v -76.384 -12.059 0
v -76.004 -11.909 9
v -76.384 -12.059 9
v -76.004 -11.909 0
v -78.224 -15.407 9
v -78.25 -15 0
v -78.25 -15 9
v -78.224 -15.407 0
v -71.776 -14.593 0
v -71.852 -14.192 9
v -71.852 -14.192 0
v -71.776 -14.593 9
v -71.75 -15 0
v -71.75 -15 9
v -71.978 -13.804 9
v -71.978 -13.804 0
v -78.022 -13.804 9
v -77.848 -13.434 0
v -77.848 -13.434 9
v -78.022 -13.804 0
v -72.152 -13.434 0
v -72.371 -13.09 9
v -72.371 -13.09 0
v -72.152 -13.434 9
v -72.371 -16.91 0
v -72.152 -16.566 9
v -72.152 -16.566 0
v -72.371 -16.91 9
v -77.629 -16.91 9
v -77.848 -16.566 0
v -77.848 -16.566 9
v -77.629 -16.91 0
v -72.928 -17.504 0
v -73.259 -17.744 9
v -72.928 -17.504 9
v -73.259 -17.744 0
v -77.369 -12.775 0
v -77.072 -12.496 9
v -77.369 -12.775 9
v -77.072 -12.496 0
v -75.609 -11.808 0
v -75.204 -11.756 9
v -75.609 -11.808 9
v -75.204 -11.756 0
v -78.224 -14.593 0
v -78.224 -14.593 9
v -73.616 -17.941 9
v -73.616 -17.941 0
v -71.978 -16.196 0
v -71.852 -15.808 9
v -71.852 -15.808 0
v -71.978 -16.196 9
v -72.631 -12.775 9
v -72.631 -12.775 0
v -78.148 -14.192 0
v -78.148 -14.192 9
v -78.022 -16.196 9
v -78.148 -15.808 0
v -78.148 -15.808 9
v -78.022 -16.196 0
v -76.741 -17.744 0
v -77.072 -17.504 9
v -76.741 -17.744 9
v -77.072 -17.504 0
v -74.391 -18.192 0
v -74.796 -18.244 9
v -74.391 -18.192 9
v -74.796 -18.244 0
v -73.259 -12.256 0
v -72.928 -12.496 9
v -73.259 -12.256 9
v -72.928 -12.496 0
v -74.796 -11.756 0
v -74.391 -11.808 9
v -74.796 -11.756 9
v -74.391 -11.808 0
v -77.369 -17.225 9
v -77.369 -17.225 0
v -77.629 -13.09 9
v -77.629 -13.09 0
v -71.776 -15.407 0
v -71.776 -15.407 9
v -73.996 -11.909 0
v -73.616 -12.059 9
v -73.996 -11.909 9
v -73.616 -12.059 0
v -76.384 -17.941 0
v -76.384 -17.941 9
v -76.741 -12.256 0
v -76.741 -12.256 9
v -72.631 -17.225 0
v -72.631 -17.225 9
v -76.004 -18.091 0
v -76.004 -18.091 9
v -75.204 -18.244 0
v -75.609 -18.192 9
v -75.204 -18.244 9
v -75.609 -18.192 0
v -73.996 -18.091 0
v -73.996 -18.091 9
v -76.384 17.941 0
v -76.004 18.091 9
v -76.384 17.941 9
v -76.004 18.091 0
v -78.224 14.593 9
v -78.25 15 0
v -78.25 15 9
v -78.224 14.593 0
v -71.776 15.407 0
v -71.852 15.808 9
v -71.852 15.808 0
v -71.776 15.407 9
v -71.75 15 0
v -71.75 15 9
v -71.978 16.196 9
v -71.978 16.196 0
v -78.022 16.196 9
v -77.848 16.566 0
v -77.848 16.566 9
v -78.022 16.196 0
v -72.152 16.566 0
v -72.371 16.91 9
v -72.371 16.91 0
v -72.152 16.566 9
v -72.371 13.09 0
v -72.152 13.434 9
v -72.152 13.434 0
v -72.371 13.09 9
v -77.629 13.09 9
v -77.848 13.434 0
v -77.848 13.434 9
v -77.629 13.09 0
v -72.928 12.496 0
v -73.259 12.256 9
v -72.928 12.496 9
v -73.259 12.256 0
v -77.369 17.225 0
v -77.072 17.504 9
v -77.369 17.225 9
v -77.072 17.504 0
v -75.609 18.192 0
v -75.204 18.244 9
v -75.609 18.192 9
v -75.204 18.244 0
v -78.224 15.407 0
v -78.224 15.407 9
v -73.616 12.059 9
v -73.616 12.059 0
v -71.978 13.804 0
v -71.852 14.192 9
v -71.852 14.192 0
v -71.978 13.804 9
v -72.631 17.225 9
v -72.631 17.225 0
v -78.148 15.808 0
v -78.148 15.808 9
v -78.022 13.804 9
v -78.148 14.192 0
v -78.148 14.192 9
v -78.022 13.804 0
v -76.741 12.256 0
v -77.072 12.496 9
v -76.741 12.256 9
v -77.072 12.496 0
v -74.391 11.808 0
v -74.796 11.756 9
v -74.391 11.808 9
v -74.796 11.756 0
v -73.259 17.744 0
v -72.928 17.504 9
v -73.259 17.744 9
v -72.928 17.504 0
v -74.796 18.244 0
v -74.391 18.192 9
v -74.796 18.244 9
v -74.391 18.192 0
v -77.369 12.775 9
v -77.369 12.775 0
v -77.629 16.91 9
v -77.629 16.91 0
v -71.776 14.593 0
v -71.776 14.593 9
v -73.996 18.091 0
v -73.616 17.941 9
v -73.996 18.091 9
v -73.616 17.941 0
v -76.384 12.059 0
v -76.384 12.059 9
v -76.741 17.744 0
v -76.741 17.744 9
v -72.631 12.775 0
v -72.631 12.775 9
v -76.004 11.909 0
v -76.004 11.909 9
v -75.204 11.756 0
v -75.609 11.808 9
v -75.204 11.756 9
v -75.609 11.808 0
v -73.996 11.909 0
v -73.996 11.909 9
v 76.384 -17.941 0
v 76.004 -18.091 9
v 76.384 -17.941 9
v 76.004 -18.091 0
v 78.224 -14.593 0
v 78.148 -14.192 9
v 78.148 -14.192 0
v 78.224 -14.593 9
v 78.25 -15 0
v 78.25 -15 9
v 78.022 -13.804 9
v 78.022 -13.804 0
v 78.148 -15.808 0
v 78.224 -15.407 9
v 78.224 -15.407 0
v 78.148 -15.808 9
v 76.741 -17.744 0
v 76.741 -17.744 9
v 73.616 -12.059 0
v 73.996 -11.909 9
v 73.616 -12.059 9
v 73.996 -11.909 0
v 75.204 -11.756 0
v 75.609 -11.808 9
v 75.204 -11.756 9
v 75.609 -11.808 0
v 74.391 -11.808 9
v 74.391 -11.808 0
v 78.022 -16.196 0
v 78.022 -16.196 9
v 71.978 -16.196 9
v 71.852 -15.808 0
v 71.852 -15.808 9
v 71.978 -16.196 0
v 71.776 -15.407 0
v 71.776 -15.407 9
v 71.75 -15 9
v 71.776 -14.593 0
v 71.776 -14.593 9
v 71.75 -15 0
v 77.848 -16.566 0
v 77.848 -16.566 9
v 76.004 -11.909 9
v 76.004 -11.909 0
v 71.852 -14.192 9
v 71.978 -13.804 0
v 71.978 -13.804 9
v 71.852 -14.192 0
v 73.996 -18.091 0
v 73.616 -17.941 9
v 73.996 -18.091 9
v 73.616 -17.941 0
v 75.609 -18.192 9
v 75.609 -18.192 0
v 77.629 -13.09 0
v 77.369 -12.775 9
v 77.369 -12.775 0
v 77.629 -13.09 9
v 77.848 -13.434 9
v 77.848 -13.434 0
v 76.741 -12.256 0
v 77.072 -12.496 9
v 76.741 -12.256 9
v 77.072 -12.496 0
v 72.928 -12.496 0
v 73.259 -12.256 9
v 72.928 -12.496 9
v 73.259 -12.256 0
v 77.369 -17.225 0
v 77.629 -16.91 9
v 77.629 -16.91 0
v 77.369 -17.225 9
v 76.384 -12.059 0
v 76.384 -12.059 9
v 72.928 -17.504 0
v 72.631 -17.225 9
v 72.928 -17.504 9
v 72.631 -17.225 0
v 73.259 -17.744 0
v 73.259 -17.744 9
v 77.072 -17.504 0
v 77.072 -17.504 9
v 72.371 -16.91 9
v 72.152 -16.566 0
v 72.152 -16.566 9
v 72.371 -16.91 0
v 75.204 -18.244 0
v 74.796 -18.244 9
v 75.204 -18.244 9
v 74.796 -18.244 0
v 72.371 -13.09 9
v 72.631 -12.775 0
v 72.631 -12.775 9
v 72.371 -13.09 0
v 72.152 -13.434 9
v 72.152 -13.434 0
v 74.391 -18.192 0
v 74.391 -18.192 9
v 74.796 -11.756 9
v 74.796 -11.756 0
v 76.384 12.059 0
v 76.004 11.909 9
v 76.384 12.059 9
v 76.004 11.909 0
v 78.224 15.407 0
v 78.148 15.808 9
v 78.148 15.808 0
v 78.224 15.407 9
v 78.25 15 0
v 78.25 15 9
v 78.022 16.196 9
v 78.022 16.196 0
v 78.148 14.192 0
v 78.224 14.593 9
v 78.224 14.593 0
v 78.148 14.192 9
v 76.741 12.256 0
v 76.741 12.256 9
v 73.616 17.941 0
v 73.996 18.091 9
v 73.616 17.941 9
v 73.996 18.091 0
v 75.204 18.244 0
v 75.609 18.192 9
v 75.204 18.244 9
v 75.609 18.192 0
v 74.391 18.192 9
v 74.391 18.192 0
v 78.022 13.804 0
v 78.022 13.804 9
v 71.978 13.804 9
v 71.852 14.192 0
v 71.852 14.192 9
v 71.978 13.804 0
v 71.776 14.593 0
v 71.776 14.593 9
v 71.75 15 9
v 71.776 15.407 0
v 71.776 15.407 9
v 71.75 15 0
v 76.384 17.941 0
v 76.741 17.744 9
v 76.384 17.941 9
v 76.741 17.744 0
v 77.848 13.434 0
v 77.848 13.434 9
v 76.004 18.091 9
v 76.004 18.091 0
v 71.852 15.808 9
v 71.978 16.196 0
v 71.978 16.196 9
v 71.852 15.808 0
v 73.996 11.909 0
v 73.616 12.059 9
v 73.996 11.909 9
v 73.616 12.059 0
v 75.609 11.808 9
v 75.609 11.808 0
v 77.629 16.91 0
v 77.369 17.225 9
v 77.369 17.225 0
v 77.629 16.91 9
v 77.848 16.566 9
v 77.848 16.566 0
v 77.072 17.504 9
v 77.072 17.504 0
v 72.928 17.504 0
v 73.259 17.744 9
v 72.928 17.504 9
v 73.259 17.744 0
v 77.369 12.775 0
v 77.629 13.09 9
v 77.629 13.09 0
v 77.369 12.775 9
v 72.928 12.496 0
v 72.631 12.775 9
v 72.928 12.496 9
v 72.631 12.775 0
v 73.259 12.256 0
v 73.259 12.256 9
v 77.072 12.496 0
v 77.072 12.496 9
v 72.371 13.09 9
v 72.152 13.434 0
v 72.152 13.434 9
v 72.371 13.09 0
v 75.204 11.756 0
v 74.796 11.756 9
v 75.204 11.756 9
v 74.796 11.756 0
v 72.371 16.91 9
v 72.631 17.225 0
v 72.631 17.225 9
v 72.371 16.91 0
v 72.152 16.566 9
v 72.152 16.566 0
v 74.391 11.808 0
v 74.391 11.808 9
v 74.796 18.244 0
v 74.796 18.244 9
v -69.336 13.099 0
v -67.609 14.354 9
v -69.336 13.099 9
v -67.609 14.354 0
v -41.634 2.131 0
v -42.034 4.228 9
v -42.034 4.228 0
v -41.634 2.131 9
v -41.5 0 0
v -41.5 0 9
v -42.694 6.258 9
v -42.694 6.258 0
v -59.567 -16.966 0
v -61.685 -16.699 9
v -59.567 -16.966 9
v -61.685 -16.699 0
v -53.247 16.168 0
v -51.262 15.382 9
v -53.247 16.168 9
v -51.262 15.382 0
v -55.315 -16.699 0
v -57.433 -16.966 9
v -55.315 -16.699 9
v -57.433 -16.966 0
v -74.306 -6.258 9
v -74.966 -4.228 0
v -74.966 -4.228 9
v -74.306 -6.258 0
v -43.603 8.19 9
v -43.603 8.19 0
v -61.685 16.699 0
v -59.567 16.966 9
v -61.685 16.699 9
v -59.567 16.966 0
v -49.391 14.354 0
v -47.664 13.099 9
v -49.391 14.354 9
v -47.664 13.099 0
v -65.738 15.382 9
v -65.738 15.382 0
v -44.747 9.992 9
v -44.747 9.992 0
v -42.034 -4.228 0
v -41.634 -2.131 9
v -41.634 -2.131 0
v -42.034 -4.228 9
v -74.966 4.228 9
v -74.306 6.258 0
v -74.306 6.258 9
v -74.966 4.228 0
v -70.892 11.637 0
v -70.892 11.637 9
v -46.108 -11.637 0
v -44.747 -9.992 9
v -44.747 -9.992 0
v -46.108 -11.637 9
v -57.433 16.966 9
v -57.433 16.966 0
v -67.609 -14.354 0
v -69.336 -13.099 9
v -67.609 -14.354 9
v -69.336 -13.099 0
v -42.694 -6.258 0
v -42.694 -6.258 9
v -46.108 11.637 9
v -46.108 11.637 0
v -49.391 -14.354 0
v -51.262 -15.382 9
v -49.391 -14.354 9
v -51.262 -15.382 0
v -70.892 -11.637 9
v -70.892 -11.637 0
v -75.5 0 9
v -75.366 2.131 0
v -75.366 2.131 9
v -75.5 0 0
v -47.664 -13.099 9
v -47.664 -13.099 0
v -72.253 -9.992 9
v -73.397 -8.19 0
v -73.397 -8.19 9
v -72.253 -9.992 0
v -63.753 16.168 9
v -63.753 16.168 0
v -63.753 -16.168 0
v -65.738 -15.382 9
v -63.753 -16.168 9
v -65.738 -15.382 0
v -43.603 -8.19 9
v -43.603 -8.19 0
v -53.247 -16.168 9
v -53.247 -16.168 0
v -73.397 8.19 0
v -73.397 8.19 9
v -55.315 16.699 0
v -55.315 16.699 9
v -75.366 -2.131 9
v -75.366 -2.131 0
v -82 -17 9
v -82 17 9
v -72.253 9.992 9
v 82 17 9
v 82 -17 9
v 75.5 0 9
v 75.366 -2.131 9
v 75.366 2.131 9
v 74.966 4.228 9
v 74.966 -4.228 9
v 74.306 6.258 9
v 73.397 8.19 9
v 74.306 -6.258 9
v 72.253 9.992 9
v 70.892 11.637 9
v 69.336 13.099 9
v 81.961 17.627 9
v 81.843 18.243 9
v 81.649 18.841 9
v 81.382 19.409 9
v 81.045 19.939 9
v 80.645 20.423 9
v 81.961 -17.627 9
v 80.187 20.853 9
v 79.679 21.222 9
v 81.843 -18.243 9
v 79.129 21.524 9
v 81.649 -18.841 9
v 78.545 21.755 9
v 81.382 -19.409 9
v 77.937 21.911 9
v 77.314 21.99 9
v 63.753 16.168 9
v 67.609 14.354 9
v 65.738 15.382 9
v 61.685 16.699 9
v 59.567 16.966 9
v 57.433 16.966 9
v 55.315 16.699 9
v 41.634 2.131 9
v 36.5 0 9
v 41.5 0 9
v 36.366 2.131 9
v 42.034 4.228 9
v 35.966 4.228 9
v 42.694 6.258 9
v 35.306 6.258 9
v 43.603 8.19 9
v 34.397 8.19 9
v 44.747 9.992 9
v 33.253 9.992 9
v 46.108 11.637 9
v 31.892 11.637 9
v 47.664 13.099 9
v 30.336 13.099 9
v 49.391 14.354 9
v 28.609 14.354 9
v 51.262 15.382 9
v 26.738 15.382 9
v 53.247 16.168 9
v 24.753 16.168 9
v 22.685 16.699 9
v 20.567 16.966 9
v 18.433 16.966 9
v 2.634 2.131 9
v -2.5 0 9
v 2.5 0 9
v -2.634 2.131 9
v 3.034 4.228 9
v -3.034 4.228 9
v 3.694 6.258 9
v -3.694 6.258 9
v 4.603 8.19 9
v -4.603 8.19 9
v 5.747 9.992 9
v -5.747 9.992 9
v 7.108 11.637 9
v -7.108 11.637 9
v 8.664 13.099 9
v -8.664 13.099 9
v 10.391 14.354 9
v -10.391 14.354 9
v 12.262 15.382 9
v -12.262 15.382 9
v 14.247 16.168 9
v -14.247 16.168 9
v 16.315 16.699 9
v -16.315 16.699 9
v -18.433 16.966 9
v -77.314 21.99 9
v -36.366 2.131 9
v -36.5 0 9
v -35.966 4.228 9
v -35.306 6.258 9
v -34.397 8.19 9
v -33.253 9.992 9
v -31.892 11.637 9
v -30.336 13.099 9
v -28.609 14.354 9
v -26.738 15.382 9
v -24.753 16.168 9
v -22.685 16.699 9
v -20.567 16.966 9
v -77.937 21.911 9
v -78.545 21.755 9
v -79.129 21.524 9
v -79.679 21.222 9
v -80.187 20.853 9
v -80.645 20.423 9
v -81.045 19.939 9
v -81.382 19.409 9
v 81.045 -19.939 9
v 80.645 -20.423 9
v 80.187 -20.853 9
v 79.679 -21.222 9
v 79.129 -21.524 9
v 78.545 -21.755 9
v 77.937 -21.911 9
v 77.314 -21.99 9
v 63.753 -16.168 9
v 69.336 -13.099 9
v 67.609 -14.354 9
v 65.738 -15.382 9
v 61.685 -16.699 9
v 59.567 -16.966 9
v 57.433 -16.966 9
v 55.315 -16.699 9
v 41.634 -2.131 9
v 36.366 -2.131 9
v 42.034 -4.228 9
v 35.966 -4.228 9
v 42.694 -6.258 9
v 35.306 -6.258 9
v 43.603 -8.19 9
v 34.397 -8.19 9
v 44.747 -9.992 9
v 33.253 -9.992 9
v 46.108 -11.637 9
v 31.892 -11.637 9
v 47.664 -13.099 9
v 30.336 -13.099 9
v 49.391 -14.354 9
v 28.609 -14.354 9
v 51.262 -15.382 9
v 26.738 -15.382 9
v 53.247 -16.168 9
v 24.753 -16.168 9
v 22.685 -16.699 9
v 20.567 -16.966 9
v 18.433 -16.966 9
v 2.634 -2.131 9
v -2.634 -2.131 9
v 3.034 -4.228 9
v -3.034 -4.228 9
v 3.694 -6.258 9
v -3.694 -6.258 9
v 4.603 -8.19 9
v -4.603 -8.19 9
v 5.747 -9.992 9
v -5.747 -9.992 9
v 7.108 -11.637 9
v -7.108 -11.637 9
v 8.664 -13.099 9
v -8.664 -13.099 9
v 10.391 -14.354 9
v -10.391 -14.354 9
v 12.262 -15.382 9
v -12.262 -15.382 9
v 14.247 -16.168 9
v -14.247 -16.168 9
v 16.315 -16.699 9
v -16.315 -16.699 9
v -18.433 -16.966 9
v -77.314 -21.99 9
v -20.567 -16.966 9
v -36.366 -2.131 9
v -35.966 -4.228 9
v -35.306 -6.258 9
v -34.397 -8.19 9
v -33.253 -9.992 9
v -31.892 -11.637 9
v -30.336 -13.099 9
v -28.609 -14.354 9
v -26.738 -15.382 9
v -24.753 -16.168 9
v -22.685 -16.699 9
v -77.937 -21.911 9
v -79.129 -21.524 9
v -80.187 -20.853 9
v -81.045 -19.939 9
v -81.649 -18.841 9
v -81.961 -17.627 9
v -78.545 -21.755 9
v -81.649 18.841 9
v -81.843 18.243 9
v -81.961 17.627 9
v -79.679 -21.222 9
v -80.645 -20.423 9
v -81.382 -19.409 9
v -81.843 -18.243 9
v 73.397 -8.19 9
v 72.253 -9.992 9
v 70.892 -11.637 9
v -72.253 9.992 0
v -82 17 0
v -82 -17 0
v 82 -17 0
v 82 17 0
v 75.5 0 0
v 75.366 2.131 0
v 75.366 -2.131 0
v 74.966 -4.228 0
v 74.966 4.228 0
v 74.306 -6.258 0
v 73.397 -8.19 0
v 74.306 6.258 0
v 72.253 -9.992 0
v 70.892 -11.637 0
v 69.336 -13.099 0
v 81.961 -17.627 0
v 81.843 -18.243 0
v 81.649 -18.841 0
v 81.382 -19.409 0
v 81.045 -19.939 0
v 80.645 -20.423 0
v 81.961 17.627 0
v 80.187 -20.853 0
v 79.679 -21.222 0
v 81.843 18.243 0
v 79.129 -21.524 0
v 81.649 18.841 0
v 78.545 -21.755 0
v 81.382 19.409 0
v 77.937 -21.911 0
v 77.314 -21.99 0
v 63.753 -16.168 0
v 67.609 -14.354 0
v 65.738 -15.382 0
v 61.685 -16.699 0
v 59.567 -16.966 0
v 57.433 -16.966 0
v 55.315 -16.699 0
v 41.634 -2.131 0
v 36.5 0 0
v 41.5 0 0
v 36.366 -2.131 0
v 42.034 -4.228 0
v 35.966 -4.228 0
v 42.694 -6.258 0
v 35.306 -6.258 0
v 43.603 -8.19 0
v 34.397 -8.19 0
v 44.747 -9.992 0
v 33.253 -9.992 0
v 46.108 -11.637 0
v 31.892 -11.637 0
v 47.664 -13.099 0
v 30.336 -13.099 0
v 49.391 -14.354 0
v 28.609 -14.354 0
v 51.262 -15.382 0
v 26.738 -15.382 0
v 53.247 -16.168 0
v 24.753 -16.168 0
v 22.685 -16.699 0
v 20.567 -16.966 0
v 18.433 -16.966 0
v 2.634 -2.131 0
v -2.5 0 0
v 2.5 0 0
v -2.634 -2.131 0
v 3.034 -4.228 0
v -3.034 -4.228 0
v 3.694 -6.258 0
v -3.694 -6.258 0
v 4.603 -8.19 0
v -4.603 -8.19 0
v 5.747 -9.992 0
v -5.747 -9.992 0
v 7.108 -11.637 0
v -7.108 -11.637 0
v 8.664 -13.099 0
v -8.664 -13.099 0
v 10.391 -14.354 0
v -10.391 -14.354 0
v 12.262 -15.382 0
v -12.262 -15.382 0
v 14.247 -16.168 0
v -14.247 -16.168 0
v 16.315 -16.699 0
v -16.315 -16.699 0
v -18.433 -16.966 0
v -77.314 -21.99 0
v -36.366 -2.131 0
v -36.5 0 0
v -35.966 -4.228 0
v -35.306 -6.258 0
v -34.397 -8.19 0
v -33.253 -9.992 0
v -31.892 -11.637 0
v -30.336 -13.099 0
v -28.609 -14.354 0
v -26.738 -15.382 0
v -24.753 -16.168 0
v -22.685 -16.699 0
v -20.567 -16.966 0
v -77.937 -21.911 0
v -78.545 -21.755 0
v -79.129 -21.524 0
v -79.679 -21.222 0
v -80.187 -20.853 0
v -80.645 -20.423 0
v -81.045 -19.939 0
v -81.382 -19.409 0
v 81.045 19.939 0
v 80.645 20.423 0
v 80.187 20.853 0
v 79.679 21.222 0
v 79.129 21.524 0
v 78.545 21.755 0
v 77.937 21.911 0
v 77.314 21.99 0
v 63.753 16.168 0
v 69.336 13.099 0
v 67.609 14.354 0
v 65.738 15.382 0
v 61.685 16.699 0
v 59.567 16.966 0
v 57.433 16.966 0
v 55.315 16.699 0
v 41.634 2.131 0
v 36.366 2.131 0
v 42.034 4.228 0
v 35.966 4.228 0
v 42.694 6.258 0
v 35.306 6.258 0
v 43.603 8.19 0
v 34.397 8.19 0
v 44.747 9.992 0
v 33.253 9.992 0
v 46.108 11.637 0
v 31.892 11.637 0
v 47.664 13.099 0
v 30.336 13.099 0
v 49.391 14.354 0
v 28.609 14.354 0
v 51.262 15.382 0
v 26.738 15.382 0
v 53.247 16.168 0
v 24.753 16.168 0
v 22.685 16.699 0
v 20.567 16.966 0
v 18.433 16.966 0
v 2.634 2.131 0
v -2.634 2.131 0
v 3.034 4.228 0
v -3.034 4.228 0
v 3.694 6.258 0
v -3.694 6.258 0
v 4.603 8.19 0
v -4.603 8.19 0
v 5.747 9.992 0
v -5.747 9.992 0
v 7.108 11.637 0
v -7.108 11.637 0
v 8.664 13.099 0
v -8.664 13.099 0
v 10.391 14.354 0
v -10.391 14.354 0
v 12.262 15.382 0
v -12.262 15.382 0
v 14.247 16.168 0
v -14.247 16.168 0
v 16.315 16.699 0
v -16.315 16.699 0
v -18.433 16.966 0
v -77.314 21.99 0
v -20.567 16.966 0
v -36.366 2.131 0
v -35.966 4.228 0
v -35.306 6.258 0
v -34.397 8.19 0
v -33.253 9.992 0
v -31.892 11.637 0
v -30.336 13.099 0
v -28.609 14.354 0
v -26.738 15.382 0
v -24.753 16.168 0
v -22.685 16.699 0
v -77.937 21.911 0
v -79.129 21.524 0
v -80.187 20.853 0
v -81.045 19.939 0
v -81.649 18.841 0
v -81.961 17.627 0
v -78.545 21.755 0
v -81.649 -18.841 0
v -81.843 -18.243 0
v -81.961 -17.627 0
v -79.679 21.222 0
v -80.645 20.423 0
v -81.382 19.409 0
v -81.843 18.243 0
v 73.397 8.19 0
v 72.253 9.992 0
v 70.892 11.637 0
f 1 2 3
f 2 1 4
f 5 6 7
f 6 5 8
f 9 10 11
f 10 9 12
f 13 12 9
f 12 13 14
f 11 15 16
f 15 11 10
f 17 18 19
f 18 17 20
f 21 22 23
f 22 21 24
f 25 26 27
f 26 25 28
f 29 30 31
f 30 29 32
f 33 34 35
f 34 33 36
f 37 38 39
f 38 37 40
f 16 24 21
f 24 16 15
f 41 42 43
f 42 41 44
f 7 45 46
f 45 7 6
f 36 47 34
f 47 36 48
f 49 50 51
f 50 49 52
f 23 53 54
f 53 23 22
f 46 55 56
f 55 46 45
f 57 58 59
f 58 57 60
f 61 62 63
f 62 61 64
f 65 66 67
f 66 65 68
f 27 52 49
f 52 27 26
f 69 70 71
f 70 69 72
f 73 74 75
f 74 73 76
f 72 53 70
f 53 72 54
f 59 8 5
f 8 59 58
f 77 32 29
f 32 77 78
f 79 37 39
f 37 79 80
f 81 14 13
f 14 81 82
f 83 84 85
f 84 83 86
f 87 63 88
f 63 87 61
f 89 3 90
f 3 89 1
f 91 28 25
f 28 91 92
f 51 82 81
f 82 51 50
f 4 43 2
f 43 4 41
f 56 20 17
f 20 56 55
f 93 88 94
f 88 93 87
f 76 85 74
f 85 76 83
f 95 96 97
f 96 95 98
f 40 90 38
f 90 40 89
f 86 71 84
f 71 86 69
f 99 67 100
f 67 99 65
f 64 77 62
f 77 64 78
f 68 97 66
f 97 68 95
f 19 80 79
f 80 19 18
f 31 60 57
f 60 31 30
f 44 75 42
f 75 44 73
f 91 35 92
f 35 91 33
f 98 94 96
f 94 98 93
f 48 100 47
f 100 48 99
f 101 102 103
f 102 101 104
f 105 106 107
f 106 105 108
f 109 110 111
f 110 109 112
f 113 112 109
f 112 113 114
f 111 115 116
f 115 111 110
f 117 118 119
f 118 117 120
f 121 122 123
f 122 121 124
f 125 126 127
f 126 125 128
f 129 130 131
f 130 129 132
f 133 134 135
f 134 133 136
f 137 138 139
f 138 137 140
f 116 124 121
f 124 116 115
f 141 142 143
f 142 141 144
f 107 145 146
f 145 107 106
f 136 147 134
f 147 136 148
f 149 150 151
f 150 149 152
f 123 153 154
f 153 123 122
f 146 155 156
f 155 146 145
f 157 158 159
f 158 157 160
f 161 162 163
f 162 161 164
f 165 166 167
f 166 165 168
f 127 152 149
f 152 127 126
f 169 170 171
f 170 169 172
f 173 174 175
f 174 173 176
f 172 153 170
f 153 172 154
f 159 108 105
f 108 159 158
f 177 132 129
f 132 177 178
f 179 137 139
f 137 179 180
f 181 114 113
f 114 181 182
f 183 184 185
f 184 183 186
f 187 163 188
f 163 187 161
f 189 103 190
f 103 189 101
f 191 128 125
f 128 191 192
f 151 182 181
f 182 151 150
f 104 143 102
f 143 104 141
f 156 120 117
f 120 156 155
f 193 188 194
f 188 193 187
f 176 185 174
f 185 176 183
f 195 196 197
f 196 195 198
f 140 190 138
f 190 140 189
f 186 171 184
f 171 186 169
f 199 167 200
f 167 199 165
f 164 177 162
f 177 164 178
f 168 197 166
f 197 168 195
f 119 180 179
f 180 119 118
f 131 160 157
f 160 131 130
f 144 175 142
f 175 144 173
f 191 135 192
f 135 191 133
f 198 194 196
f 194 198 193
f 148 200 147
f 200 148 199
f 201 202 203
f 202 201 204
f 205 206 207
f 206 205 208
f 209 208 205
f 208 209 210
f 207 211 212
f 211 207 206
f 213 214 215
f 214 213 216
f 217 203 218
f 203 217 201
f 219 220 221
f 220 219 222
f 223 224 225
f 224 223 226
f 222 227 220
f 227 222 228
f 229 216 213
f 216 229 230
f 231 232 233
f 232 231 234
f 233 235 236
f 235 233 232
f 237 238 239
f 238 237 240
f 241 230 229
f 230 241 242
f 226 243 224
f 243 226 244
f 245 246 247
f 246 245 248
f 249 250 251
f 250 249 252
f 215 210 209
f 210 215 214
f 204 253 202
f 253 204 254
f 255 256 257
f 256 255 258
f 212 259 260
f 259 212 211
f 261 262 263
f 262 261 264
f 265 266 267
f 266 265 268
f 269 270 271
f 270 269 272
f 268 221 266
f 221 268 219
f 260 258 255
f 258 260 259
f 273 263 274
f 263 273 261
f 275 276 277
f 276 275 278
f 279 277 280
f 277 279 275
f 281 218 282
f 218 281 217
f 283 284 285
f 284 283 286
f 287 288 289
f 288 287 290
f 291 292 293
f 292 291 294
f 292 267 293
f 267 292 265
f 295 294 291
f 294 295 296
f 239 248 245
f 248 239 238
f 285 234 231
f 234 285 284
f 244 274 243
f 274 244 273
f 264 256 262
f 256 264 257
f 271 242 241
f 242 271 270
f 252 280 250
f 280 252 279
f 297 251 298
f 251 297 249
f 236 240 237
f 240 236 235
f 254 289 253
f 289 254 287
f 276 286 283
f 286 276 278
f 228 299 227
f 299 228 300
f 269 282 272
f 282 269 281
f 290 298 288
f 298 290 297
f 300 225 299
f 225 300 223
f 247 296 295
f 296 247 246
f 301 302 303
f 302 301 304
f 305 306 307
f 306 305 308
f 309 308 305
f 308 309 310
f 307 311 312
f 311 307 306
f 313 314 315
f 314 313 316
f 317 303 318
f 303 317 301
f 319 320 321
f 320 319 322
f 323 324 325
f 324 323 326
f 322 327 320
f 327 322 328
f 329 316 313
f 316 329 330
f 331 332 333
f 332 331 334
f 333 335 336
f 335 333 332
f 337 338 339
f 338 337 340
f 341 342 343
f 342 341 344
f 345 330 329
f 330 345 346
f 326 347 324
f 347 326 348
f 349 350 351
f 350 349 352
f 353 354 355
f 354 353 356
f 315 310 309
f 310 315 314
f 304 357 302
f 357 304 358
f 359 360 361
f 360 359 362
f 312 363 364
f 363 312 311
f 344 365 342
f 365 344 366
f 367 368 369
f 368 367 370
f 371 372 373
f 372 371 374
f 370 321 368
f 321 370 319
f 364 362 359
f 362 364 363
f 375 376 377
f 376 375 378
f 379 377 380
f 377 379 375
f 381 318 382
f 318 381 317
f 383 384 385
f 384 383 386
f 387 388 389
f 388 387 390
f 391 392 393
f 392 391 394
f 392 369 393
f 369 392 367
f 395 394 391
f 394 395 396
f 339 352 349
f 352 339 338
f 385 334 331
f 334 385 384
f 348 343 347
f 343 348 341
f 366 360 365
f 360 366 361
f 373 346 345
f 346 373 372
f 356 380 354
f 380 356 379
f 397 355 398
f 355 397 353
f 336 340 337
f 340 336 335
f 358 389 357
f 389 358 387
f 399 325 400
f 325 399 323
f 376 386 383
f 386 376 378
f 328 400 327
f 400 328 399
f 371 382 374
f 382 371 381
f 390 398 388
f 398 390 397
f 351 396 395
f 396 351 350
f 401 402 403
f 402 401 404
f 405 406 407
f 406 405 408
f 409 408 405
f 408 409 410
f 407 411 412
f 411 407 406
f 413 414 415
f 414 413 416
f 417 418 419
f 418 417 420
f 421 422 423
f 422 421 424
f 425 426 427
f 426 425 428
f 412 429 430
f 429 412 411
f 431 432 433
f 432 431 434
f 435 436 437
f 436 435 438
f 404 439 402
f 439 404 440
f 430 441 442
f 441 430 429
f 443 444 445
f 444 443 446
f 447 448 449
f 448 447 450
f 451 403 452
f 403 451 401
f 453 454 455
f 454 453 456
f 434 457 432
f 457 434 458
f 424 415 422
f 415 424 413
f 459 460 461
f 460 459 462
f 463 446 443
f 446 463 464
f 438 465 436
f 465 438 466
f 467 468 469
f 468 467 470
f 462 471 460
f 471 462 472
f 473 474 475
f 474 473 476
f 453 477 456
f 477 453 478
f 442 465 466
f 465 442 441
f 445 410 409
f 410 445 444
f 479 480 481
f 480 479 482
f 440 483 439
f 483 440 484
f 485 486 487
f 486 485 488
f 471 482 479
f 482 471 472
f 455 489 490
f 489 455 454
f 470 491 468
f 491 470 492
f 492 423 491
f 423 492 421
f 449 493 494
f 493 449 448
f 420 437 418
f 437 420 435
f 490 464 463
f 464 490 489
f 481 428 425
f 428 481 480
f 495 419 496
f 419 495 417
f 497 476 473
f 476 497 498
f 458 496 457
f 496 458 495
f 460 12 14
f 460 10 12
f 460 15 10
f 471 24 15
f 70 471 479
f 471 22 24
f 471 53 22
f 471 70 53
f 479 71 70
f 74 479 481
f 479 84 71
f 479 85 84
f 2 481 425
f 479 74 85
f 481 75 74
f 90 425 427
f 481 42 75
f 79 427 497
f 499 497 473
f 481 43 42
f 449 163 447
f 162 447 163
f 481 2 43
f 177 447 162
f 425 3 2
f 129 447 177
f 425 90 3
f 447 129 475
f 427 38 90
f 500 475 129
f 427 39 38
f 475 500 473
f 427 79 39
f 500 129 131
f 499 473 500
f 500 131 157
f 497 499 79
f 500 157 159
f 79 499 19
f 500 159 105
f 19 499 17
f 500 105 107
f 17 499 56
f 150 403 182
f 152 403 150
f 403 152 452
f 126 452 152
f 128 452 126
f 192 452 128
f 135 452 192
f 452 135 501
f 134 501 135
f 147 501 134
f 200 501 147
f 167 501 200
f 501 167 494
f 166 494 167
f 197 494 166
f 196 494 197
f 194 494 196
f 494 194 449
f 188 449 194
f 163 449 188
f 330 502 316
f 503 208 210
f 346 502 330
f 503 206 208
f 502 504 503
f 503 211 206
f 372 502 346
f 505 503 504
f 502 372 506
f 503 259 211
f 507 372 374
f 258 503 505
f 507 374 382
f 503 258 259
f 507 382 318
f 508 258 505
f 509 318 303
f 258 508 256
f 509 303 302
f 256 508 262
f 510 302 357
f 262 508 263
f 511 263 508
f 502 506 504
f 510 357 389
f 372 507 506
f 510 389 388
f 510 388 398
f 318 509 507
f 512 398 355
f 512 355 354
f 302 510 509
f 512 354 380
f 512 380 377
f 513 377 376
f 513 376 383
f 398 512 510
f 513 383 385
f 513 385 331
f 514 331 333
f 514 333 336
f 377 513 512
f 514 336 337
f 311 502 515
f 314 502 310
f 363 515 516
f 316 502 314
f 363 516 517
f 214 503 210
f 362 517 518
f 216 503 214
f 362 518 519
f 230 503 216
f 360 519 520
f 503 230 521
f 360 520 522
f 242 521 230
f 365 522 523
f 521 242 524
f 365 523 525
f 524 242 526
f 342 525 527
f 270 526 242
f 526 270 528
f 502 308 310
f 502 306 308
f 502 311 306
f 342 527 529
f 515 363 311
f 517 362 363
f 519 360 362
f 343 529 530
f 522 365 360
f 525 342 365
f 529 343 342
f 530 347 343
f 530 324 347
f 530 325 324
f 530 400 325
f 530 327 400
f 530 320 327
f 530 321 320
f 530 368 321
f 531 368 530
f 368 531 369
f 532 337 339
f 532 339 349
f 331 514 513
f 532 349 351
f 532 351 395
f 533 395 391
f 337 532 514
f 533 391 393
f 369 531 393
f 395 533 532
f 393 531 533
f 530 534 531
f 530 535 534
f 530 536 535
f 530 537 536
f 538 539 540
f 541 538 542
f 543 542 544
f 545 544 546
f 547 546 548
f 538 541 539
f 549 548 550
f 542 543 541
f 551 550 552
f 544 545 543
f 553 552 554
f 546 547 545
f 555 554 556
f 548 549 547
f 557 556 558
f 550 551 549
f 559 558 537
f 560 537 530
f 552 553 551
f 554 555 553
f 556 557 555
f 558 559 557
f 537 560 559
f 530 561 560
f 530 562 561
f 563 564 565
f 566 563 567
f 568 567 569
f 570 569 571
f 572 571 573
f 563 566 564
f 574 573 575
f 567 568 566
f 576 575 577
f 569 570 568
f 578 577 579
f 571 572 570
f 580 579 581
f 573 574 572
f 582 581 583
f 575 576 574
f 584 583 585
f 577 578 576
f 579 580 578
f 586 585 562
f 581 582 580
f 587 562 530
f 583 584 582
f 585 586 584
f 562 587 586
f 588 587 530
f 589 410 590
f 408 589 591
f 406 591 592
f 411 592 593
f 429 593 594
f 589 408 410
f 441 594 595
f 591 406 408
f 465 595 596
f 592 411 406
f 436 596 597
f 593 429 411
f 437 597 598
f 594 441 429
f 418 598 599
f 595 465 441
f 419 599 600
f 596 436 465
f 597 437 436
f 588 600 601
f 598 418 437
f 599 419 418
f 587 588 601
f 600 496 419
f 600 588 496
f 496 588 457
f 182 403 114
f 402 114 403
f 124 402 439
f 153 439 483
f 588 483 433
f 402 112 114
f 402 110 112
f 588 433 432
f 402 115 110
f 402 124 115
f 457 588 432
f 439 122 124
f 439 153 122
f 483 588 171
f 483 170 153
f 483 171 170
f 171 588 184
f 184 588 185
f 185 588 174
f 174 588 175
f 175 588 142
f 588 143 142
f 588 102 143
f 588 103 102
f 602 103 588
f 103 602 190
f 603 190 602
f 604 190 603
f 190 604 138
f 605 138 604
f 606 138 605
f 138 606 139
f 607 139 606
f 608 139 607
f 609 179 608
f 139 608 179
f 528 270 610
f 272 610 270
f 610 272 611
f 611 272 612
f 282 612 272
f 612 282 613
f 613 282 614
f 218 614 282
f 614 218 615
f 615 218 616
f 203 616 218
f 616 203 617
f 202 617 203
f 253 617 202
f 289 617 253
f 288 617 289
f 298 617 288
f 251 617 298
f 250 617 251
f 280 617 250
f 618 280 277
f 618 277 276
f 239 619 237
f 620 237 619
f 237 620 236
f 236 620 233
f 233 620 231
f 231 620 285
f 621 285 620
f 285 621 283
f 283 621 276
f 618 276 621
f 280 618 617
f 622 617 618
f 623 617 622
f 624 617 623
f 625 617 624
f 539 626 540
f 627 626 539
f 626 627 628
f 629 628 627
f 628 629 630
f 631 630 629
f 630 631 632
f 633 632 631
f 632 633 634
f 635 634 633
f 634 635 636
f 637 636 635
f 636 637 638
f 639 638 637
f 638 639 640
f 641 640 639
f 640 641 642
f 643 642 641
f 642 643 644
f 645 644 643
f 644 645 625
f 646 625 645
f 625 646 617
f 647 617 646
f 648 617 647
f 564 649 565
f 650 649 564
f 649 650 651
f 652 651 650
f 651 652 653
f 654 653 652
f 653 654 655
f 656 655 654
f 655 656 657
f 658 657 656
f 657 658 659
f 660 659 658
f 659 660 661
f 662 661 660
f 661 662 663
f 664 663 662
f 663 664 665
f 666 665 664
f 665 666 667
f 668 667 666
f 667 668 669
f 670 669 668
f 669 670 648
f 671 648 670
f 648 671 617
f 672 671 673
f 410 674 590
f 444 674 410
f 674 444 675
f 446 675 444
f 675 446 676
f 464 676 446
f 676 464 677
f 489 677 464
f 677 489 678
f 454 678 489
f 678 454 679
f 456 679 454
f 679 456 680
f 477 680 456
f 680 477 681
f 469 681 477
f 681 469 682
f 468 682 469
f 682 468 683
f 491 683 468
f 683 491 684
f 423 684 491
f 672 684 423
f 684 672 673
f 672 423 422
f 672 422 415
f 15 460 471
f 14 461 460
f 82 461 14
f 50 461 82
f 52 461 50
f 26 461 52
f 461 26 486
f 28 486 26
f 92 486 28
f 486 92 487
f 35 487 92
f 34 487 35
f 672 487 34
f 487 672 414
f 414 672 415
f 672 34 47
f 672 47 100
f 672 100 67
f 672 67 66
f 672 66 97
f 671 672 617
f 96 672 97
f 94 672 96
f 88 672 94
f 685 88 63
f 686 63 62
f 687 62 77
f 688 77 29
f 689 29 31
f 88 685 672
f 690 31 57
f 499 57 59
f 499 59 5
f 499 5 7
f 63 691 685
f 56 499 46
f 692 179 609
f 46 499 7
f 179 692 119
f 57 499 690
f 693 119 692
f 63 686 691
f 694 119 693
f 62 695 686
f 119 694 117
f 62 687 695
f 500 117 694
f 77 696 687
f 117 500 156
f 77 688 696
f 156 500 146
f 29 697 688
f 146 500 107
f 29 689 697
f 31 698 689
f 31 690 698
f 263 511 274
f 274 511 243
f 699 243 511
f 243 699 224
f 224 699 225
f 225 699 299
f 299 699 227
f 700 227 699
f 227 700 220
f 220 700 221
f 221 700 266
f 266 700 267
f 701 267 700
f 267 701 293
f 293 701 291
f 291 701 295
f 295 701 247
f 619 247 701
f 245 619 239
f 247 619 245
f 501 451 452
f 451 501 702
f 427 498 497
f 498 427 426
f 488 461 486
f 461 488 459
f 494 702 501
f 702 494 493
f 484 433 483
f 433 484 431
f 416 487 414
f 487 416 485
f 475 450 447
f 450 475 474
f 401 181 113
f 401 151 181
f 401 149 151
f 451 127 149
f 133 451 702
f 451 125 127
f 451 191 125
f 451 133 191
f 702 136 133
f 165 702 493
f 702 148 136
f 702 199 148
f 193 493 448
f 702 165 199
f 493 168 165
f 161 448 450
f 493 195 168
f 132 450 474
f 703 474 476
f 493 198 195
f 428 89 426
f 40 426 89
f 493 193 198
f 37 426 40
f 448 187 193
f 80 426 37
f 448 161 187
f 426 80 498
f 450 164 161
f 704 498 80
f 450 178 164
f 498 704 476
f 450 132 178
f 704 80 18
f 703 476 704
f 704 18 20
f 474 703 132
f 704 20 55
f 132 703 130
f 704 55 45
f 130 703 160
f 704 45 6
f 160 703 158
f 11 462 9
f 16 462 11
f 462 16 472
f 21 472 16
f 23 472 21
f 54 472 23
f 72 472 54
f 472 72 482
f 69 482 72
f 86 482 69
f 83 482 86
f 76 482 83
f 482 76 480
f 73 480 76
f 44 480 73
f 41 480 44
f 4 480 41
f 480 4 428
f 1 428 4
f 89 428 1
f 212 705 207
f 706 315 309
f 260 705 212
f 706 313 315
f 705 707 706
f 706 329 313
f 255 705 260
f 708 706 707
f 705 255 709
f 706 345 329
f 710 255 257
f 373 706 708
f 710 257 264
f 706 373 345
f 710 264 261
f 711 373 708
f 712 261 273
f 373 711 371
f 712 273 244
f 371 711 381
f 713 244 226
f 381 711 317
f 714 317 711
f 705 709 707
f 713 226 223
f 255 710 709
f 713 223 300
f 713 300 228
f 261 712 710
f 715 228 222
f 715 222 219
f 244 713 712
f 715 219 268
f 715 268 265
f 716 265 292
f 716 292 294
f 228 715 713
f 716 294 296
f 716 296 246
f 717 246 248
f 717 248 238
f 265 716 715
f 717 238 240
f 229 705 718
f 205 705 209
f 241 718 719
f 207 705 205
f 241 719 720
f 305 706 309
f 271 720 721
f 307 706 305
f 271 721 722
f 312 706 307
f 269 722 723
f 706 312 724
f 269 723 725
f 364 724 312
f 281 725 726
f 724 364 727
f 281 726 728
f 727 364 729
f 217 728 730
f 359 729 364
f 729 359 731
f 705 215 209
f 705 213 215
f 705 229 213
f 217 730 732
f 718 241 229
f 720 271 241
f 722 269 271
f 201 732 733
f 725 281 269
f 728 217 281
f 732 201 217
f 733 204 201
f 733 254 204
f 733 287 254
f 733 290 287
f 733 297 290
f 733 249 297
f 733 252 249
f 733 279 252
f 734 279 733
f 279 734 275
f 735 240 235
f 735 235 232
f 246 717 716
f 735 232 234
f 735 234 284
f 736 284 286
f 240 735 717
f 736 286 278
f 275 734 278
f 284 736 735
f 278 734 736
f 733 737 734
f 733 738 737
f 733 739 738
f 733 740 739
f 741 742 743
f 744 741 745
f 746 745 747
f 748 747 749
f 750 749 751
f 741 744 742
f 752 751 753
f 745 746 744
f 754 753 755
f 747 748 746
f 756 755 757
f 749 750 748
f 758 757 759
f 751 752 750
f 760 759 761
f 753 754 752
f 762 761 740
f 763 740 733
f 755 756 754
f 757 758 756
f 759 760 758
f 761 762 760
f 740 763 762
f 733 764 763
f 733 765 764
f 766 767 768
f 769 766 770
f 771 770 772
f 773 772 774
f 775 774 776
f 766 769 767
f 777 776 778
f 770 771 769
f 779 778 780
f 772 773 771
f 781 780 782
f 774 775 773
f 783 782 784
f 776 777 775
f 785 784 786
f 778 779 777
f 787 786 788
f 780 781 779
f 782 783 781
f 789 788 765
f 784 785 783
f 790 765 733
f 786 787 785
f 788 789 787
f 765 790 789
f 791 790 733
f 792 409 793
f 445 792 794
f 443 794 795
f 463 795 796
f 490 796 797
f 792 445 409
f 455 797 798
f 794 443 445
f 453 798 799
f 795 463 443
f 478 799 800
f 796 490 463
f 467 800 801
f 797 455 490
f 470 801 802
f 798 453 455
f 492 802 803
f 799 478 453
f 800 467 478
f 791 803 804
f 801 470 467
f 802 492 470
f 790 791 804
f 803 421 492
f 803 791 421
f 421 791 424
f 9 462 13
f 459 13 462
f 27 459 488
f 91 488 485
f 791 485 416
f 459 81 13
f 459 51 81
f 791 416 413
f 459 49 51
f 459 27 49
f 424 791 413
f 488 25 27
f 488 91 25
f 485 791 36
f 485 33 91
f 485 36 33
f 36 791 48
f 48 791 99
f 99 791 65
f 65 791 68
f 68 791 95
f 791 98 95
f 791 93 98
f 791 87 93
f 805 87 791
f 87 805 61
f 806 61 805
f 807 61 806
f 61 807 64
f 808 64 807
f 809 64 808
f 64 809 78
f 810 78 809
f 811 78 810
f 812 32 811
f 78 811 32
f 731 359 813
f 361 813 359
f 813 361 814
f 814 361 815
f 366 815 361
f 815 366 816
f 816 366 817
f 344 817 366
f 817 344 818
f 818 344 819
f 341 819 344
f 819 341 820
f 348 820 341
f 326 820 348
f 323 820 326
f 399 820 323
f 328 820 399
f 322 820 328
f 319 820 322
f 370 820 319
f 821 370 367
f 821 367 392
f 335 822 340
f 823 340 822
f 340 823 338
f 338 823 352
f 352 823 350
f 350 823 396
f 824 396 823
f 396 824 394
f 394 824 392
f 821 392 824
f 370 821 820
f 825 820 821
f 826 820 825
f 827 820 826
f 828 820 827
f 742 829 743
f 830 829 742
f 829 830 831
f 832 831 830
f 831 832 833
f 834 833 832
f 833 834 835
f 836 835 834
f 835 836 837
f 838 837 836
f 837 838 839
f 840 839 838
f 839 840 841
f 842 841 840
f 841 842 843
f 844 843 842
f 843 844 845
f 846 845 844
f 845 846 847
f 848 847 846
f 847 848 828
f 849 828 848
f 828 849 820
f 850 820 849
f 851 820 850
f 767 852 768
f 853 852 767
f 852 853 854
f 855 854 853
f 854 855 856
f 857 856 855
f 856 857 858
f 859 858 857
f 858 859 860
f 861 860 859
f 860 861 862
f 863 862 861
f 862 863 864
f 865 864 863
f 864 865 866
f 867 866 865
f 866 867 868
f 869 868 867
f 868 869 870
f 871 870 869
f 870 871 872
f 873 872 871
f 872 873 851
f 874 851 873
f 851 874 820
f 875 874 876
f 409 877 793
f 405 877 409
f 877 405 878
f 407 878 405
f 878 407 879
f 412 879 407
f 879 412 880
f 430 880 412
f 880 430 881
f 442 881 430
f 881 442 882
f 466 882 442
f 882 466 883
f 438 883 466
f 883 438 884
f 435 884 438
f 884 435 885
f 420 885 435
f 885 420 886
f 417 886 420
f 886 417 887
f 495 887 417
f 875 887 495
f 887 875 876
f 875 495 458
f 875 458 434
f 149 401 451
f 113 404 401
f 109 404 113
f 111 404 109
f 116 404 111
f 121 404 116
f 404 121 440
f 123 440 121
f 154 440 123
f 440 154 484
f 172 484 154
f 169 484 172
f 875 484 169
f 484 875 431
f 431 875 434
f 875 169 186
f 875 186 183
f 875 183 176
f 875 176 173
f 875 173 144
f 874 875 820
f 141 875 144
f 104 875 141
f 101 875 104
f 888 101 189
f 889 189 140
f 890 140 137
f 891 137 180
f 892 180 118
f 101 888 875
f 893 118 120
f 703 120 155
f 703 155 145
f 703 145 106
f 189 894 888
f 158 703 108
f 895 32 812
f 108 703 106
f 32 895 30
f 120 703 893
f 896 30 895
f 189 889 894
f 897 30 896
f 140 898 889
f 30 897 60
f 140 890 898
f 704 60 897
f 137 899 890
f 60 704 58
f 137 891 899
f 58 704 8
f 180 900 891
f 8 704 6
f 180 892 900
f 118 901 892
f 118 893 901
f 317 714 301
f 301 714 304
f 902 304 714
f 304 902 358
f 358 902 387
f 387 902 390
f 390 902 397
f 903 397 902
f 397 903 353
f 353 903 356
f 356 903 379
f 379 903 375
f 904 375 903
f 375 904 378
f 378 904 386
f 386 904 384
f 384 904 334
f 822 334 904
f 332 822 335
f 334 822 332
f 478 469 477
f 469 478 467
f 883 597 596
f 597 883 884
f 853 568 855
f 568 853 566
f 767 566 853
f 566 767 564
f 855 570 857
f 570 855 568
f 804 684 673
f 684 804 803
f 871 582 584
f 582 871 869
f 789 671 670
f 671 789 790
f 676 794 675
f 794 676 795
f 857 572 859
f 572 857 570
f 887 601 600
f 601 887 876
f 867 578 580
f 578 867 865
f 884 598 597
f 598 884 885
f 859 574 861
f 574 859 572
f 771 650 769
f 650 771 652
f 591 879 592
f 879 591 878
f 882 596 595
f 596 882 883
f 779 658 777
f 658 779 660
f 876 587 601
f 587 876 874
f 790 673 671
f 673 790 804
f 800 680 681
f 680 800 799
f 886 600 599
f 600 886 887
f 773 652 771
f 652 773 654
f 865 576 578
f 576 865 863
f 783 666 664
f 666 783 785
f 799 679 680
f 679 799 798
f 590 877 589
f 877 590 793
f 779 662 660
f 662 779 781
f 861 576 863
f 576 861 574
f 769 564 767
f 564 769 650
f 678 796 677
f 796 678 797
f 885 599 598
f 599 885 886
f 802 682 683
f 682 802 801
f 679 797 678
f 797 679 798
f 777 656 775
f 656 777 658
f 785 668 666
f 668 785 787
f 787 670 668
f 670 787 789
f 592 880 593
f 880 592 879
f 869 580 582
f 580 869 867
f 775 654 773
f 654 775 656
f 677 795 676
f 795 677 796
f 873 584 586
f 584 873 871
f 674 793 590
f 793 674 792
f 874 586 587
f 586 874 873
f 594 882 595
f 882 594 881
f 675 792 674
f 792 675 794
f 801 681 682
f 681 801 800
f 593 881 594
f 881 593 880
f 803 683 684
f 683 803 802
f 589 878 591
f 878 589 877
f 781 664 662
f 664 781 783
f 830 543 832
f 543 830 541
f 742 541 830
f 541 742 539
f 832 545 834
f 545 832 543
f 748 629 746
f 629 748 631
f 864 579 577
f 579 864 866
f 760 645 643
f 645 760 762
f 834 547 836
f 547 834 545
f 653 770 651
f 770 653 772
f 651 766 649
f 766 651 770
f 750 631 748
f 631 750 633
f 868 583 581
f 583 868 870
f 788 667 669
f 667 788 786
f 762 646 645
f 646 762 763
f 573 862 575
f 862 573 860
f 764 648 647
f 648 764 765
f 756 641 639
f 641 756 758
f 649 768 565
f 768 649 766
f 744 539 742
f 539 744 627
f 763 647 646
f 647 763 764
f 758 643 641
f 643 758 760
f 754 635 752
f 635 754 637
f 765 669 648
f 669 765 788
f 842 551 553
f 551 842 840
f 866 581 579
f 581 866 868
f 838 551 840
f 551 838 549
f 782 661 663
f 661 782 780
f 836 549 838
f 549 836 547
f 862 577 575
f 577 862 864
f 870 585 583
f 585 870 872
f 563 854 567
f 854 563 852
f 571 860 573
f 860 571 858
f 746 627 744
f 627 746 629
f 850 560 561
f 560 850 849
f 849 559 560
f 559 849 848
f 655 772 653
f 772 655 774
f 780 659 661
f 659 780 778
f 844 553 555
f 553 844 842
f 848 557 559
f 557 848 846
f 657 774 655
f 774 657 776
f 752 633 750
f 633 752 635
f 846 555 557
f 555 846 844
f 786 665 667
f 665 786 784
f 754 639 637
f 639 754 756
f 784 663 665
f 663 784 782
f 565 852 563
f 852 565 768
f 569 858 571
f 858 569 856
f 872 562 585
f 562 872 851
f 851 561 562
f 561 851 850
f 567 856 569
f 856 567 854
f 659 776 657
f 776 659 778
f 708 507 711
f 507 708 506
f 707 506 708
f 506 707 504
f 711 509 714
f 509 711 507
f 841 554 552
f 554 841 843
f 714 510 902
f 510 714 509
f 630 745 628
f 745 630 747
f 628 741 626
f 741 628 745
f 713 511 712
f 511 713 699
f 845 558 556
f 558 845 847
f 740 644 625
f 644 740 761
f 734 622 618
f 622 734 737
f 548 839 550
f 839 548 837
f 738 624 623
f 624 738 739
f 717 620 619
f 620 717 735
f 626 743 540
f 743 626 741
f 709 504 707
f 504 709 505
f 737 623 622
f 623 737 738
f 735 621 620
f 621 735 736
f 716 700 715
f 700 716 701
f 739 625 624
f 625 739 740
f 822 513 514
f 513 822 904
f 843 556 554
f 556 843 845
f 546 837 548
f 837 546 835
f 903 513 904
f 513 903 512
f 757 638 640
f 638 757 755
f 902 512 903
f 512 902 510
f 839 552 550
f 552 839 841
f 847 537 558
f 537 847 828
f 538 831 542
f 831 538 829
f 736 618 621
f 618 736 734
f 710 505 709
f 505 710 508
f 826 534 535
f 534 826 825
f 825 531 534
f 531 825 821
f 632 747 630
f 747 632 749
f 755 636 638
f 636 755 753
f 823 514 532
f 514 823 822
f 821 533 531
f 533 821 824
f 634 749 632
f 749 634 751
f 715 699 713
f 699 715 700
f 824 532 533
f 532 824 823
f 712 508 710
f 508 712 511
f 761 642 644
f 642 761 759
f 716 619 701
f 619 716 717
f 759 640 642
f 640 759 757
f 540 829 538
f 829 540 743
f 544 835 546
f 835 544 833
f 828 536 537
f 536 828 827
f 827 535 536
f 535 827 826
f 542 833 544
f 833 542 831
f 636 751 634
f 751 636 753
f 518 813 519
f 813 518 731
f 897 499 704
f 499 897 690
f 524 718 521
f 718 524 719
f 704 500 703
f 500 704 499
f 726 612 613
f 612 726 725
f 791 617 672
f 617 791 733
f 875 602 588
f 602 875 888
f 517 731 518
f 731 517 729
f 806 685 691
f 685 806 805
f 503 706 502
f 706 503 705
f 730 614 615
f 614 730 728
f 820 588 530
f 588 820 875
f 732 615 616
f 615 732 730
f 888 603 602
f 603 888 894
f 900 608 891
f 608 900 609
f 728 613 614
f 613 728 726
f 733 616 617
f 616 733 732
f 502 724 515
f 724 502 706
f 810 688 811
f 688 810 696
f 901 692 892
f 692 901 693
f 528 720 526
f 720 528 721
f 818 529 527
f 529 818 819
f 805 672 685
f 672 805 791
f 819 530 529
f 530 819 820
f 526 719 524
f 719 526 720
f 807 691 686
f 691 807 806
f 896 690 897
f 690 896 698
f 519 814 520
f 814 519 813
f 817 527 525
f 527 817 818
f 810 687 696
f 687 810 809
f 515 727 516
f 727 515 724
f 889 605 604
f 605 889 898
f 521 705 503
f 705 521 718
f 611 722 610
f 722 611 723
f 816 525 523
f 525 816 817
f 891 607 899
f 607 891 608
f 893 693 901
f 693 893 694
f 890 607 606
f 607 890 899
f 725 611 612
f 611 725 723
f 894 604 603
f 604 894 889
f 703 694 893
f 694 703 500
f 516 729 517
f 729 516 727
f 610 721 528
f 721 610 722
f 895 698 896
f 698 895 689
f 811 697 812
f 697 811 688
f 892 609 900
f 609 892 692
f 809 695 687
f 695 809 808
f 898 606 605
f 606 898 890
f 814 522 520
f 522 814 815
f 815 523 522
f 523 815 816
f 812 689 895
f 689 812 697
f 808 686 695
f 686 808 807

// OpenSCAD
$fn = 50;


difference() {
	union() {
		hull() {
			translate(v = [-77.0000000000, 17.0000000000, 0]) {
				cylinder(h = 9, r = 5);
			}
			translate(v = [77.0000000000, 17.0000000000, 0]) {
				cylinder(h = 9, r = 5);
			}
			translate(v = [-77.0000000000, -17.0000000000, 0]) {
				cylinder(h = 9, r = 5);
			}
			translate(v = [77.0000000000, -17.0000000000, 0]) {
				cylinder(h = 9, r = 5);
			}
		}
	}
	union() {
		#translate(v = [-75.0000000000, -15.0000000000, -100.0000000000]) {
			cylinder(h = 200, r = 3.2500000000);
		}
		#translate(v = [-75.0000000000, 15.0000000000, -100.0000000000]) {
			cylinder(h = 200, r = 3.2500000000);
		}
		#translate(v = [75.0000000000, -15.0000000000, -100.0000000000]) {
			cylinder(h = 200, r = 3.2500000000);
		}
		#translate(v = [75.0000000000, 15.0000000000, -100.0000000000]) {
			cylinder(h = 200, r = 3.2500000000);
		}
		#translate(v = [-58.5000000000, 0, 0]) {
			cylinder(h = 9, r = 17.0000000000);
		}
		#translate(v = [-19.5000000000, 0, 0]) {
			cylinder(h = 9, r = 17.0000000000);
		}
		#translate(v = [19.5000000000, 0, 0]) {
			cylinder(h = 9, r = 17.0000000000);
		}
		#translate(v = [58.5000000000, 0, 0]) {
			cylinder(h = 9, r = 17.0000000000);
		}
	}
}
